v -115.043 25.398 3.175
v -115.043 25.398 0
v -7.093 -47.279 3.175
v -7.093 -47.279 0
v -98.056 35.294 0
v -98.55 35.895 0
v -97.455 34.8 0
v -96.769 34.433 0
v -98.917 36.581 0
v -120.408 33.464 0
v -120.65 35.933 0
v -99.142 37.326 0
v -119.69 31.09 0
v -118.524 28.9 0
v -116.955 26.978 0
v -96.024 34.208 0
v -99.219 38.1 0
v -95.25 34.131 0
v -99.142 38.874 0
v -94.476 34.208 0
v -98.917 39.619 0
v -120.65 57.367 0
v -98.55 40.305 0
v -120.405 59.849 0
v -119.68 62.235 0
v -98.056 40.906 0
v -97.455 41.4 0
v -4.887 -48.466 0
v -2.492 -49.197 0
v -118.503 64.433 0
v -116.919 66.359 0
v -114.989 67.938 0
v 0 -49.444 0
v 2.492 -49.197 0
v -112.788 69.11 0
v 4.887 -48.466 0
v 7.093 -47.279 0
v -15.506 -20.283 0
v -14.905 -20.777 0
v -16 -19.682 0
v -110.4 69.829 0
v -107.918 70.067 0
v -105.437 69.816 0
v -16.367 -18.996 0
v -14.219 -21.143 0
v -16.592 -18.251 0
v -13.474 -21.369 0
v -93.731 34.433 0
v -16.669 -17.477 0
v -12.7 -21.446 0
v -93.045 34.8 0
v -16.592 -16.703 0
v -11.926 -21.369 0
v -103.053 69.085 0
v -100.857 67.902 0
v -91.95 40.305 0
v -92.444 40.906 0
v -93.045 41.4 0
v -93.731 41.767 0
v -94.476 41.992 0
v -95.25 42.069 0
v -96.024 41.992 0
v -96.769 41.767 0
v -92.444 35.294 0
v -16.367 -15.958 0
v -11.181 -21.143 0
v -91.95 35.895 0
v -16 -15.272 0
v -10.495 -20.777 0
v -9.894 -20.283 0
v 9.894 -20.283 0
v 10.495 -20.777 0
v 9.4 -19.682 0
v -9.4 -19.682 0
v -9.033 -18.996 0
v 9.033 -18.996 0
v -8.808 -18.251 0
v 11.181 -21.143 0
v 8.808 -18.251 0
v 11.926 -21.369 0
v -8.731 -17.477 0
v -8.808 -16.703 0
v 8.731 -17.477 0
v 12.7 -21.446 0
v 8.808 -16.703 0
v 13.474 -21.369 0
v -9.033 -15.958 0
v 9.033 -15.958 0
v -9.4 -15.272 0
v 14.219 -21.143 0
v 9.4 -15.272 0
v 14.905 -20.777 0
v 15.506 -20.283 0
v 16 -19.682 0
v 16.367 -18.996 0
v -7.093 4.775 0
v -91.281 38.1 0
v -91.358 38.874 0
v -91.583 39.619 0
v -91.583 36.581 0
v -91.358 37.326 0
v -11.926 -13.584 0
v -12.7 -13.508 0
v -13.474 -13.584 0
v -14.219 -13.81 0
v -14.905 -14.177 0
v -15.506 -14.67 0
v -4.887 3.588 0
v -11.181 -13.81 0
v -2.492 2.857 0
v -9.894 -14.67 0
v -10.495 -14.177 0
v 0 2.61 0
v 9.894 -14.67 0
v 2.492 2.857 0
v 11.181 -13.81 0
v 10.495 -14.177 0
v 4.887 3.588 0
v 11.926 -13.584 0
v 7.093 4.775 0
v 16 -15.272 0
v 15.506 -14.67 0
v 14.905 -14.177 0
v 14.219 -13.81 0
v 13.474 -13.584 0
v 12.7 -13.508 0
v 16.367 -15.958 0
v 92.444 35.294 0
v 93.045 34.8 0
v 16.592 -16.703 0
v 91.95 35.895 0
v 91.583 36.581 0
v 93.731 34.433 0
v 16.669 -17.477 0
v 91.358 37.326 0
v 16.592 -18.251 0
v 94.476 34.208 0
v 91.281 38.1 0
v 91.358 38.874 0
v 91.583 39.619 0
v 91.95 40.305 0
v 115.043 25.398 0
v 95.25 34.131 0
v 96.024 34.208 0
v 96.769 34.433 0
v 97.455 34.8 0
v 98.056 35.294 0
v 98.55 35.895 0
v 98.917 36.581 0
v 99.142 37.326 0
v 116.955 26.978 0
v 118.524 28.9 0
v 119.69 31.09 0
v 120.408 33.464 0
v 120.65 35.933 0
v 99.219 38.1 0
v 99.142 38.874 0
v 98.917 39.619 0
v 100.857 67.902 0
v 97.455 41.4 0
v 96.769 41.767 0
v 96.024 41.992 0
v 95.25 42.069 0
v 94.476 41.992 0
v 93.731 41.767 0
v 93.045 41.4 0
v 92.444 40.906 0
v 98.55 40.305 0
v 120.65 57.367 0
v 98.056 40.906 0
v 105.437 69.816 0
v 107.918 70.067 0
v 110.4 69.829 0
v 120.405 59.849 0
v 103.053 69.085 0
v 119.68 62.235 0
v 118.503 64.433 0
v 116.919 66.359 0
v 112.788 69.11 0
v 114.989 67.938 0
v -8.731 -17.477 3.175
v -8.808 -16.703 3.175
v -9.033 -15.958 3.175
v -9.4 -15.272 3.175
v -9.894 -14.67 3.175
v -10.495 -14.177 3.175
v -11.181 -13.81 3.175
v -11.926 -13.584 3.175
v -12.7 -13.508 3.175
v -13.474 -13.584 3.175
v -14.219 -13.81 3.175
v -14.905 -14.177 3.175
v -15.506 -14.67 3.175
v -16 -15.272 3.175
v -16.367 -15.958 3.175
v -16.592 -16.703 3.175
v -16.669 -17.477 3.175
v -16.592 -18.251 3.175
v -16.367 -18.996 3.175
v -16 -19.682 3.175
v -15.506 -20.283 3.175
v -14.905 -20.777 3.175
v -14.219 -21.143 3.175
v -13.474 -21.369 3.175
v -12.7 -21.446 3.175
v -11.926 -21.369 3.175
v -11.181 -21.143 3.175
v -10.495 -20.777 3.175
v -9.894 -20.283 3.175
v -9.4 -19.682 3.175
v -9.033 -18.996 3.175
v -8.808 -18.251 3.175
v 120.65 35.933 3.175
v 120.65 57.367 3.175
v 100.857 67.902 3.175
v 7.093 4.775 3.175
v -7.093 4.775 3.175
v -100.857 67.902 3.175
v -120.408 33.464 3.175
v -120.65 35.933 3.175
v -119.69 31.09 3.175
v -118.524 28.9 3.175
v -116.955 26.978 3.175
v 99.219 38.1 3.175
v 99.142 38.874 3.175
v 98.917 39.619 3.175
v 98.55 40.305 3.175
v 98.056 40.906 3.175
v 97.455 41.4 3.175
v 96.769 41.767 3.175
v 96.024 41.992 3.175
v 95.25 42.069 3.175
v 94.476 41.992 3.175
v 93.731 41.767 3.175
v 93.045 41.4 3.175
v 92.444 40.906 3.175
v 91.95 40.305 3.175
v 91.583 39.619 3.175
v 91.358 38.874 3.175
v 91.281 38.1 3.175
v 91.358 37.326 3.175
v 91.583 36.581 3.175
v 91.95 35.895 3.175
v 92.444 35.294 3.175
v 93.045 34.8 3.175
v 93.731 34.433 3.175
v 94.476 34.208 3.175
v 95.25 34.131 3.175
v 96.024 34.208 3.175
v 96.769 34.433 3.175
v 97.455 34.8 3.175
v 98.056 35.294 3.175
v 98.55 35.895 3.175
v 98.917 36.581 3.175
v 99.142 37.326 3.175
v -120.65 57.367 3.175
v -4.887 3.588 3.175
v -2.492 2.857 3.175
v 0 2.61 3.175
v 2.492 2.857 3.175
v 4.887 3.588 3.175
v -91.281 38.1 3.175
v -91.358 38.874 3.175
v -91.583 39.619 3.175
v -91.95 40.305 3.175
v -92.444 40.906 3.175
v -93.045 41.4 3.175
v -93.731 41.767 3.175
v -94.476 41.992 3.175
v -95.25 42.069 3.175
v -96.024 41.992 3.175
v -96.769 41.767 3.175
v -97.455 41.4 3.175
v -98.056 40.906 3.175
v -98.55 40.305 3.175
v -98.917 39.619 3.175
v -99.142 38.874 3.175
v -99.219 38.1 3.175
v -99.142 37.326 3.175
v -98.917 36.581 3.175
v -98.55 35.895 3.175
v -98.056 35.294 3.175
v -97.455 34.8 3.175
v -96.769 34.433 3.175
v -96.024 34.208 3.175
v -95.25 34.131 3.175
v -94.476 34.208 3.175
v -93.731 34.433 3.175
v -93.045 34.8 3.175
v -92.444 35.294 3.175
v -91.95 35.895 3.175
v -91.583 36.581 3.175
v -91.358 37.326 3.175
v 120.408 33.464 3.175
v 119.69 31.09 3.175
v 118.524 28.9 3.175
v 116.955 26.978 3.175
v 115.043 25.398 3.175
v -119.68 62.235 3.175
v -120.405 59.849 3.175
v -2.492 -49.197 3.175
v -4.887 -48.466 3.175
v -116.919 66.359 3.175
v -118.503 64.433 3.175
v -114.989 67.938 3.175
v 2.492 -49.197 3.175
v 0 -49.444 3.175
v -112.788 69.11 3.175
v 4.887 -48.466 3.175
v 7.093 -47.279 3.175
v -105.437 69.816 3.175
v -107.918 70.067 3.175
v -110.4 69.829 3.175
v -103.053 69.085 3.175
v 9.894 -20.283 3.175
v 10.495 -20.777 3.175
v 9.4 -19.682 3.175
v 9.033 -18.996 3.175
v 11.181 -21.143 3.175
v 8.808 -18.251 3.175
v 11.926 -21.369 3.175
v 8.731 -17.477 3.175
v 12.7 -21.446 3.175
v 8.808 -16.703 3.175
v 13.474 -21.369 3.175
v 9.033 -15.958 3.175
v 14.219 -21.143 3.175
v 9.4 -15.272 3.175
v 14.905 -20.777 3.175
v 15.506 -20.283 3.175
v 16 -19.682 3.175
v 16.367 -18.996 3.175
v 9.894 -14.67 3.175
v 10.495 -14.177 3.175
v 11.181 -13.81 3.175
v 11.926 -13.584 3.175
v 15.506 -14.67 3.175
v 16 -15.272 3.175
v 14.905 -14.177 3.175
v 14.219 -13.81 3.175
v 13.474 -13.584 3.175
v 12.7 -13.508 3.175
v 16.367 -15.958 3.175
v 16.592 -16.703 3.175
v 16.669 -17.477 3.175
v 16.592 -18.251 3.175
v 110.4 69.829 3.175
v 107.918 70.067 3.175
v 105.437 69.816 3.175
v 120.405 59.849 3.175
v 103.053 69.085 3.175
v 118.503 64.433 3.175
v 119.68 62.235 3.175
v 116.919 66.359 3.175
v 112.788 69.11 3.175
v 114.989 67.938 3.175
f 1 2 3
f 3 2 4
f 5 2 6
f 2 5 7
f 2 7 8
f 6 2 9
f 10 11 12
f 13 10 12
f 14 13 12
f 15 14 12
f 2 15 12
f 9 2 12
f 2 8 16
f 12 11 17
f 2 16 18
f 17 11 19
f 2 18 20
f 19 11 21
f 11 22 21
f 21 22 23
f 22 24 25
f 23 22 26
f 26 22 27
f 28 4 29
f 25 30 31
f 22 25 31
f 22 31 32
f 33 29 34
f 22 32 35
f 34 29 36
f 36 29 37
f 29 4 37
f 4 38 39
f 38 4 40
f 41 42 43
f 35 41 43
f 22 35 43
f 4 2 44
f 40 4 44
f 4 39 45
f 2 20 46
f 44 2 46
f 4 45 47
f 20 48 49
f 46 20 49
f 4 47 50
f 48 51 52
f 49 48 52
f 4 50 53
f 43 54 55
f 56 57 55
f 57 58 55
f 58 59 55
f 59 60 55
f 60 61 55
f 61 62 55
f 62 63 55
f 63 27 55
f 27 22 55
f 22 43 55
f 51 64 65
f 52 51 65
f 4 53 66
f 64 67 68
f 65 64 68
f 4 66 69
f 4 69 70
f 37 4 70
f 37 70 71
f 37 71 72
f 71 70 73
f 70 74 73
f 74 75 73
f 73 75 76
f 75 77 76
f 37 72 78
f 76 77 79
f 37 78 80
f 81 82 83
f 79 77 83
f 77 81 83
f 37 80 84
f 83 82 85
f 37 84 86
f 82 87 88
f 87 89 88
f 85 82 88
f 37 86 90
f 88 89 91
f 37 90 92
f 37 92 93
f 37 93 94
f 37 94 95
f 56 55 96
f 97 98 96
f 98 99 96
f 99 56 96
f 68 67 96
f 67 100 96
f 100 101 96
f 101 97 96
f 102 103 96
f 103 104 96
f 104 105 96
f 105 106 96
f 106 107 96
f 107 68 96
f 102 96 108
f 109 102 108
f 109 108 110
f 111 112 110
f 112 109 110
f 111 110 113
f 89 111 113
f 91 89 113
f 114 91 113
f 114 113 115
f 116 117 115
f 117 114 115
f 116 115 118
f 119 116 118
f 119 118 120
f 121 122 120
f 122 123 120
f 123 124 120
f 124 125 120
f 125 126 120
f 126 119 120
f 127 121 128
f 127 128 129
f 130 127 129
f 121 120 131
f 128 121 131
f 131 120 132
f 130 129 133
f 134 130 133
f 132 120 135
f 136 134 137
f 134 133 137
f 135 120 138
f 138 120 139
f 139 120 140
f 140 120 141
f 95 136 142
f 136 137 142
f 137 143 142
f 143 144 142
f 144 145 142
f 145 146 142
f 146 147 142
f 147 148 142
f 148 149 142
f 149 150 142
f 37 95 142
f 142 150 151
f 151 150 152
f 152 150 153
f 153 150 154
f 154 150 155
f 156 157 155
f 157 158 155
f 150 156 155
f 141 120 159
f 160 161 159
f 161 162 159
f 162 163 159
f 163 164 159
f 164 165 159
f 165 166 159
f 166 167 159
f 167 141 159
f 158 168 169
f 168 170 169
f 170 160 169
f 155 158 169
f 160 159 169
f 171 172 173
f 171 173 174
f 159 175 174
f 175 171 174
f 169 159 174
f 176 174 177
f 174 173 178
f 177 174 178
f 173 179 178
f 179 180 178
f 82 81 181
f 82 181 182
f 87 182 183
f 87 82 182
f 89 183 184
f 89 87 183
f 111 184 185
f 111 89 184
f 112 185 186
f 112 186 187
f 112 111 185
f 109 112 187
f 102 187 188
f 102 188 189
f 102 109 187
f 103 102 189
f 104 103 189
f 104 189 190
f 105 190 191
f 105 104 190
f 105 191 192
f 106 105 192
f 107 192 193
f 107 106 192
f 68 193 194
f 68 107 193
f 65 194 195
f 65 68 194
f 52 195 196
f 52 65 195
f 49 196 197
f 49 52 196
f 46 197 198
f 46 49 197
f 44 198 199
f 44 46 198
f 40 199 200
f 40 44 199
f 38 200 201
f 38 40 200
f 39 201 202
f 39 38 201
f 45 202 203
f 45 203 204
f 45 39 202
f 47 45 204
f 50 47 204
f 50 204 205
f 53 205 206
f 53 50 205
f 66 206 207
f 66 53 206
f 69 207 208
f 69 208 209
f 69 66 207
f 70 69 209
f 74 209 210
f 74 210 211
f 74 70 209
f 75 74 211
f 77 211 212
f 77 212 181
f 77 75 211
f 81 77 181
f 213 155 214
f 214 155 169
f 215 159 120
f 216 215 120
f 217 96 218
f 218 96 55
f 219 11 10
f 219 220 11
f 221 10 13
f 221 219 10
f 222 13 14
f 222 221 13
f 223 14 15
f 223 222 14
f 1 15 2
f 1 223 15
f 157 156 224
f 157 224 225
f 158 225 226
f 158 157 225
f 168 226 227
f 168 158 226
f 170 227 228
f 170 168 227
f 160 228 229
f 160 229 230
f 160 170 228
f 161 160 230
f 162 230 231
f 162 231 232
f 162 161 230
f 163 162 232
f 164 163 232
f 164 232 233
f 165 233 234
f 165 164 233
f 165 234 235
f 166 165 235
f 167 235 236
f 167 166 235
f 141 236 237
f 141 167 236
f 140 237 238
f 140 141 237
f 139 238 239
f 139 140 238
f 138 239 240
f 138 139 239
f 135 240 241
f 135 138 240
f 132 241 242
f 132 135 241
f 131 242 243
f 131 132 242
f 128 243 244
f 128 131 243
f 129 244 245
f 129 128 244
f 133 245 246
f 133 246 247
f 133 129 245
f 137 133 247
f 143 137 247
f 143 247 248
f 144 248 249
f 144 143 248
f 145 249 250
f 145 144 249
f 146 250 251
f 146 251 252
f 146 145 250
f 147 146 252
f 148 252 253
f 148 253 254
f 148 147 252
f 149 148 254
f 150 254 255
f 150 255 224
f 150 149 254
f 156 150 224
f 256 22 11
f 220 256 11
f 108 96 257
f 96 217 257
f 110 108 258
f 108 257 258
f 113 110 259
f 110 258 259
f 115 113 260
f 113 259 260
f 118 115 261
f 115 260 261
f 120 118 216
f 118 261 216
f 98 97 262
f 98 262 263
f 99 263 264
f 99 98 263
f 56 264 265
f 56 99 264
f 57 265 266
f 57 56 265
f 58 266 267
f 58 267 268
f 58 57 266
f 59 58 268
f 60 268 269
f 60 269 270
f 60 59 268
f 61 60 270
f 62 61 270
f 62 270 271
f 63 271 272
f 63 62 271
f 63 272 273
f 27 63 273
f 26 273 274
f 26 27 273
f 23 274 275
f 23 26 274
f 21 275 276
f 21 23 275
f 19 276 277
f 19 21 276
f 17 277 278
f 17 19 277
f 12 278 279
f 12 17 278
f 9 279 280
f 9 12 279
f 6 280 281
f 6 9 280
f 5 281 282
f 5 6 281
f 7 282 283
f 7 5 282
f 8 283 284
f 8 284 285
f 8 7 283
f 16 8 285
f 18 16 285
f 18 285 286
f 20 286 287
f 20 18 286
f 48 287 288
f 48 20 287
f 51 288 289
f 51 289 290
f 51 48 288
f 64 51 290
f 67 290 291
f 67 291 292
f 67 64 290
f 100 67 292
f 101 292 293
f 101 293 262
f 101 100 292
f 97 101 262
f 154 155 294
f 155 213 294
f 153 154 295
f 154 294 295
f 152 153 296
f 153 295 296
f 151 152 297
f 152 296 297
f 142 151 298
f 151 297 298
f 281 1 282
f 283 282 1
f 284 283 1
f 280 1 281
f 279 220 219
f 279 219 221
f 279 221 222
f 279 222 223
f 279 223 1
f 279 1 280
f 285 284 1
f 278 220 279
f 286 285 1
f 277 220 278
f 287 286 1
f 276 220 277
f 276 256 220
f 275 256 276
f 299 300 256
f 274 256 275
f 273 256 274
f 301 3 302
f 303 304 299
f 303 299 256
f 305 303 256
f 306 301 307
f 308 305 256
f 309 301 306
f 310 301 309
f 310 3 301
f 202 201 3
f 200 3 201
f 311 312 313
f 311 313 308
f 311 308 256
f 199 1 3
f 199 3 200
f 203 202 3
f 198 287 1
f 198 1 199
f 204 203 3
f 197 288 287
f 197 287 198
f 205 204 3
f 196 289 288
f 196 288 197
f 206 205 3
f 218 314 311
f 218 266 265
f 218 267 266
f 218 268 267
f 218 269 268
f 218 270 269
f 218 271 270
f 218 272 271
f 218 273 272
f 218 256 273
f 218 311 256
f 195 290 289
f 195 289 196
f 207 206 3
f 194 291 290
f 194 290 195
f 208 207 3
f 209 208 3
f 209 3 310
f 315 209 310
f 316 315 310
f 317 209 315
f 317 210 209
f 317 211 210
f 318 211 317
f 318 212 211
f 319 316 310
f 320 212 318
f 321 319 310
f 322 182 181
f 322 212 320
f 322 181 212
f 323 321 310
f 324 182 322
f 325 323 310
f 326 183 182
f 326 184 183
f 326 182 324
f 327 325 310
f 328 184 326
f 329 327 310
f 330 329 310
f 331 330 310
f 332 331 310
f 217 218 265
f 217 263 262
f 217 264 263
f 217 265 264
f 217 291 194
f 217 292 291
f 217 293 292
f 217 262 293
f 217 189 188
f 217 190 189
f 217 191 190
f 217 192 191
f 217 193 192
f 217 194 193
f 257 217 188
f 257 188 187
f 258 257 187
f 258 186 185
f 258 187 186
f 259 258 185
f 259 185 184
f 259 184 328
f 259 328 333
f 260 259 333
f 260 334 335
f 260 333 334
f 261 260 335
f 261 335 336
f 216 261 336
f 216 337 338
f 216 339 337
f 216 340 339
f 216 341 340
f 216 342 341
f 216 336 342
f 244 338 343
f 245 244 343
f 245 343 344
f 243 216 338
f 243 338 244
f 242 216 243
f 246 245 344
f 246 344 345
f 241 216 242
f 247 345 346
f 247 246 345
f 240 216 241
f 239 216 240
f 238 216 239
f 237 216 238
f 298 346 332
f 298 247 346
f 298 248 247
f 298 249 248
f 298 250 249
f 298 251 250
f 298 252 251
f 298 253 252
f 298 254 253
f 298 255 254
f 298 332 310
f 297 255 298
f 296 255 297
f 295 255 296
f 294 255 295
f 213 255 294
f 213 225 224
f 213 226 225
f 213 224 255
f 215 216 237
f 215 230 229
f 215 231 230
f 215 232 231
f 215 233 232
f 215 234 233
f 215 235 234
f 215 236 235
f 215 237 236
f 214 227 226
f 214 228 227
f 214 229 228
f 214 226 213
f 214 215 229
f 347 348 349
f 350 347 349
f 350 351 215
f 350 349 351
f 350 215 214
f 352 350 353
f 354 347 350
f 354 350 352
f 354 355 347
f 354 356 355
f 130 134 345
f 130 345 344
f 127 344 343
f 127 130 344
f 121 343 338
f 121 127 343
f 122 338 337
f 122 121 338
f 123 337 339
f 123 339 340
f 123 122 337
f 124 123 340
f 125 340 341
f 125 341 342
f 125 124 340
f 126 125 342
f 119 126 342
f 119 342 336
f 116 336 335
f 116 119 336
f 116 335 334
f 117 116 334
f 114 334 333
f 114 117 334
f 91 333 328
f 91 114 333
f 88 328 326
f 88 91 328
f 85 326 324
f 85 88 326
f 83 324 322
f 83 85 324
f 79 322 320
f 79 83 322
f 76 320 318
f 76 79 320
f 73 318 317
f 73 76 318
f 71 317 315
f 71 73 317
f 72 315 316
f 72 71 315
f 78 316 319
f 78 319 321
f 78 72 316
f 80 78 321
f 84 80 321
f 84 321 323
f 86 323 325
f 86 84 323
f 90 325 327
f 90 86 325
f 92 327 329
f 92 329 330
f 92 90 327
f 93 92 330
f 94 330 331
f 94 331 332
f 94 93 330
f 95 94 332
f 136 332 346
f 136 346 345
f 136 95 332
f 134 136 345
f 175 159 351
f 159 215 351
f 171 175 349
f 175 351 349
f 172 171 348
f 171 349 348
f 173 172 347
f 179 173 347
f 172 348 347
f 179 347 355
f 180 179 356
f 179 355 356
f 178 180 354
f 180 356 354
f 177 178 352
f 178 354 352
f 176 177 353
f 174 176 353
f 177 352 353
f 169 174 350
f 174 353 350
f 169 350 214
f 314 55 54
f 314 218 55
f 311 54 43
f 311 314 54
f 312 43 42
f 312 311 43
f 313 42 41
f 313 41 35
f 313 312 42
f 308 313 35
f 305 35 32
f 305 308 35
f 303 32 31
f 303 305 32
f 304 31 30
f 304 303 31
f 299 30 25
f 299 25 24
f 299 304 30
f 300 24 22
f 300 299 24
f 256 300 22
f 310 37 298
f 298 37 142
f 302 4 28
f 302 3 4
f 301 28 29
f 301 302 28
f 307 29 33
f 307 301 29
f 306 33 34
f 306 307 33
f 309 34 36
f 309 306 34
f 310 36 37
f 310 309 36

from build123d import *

# Parameters (mm, degrees)
SKETCH1_R           = 3.96875
BOSS_EXTRUDE1_DEPTH = 3.175
FILLET1_R           = 12.7


with BuildPart() as part:
    # Sketch1 → Boss-Extrude1 (new body)
    with BuildSketch(Plane.XY):
        Polygon((0, 0), (-120.65, 81.227610635), (-120.65, 29.17348858), (0, -52.054122056), (120.65, 29.17348858), (120.65, 81.227610635), align=None)
        with Locations((-95.25, 38.1)):
            Circle(SKETCH1_R, mode=Mode.SUBTRACT)
        with Locations((95.25, 38.1)):
            Circle(SKETCH1_R, mode=Mode.SUBTRACT)
        with Locations((-12.7, -17.476786224)):
            Circle(SKETCH1_R, mode=Mode.SUBTRACT)
        with Locations((12.7, -17.476786224)):
            Circle(SKETCH1_R, mode=Mode.SUBTRACT)
    extrude(amount=BOSS_EXTRUDE1_DEPTH)

    # Fillet1
    fillet1_edges = [part.edges().sort_by_distance(p)[0] for p in [
        (120.65, 81.227610635, 1.5875),
        (120.65, 29.17348858, 1.5875),
        (0, -52.054122056, 1.5875),
        (-120.65, 29.17348858, 1.5875),
        (-120.65, 81.227610635, 1.5875),
        (0, 0, 1.5875),
    ]]
    fillet(fillet1_edges, radius=FILLET1_R)


solid = part.part
